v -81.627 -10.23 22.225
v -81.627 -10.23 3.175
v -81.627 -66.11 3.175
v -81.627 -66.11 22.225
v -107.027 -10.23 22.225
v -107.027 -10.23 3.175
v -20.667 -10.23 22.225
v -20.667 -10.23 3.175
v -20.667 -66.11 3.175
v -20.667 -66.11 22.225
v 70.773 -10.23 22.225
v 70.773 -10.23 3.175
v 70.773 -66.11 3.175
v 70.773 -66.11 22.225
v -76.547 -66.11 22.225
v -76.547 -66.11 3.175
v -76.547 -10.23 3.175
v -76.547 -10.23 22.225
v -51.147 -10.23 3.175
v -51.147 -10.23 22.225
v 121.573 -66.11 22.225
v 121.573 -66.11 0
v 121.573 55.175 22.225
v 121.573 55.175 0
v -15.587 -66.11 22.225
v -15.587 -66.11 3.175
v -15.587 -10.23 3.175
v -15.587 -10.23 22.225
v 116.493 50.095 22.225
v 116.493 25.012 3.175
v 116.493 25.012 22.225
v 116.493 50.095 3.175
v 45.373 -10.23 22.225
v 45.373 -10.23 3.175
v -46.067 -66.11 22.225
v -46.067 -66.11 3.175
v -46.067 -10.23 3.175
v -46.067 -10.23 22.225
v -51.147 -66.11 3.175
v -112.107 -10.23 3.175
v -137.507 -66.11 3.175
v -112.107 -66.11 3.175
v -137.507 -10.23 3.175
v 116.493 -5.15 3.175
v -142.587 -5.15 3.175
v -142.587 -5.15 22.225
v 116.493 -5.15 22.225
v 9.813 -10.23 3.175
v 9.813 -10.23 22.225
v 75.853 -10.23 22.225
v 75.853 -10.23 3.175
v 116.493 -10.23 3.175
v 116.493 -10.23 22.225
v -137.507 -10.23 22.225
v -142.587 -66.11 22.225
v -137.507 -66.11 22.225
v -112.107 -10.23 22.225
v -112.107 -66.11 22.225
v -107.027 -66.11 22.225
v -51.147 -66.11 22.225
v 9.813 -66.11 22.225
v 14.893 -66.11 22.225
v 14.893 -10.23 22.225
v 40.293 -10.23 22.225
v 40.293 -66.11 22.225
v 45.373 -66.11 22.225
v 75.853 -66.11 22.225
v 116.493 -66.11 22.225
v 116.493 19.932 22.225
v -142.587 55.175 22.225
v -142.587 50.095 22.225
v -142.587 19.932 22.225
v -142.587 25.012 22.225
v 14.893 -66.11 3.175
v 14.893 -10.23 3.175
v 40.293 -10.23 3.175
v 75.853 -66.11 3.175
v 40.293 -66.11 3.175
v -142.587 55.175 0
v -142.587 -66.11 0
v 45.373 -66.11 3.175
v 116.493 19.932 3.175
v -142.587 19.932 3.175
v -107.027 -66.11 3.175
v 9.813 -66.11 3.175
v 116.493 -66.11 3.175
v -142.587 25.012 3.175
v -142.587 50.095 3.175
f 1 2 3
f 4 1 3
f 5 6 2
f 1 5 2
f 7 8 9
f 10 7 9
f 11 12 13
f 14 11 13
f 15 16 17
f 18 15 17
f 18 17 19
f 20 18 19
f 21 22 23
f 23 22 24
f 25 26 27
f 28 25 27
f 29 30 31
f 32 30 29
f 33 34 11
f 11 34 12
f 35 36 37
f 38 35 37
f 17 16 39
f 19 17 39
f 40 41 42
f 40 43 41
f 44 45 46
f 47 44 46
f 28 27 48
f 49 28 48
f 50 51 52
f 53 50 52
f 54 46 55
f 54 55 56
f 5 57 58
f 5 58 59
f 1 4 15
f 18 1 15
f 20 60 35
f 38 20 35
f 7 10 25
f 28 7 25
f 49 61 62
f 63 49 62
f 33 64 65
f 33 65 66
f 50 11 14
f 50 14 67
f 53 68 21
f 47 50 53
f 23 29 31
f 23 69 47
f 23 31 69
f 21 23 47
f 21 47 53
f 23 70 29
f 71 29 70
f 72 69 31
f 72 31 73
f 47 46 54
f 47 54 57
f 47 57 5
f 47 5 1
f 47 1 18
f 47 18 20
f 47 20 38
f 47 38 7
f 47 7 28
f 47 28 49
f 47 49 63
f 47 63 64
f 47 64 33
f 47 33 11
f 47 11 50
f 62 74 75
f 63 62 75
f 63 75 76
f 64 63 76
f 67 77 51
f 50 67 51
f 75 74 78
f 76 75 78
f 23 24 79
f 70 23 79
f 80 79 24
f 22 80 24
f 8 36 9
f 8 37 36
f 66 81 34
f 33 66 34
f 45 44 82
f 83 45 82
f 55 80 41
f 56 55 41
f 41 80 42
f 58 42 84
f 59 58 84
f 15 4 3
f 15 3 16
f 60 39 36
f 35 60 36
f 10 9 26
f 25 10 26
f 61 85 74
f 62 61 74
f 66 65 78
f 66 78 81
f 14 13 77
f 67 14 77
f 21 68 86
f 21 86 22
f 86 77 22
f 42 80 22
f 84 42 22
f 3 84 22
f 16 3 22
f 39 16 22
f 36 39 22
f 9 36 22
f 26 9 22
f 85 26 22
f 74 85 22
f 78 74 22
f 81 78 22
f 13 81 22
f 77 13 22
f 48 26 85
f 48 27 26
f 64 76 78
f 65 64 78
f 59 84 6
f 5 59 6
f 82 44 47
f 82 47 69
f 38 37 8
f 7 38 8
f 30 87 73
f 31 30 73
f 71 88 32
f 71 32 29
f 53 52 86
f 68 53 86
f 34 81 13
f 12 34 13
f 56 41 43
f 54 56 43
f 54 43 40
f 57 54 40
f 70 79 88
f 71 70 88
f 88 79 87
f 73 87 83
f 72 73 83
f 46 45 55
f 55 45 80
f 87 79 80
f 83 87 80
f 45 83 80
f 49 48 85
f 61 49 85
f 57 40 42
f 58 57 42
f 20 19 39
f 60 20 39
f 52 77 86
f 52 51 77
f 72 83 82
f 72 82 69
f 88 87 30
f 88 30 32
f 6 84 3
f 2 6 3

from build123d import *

# Parameters (mm, degrees)
F0_W     = 254
F0_H     = 25.0825
F1_DEPTH = 3.175
F2_DEPTH = 22.225
F3_DEPTH = 25.4


# Not quite as in the source:
# - a feature names something its author has since deleted; it is built from what else it names


with BuildPart() as f1:
    # F0 (on Top) → F1 (new body)
    with BuildSketch(Plane.XY):
        with Locations((-10.5066807906, 37.553641122)):
            Rectangle(F0_W, F0_H)
    extrude(amount=F1_DEPTH)



with BuildPart() as f1b:
    # F0 (on Top) → F1, piece 2 (new body)
    with BuildSketch(Plane.XY):
        with Locations((-10.5066807906, 7.391141122)):
            Rectangle(F0_W, F0_H)
    extrude(amount=F1_DEPTH)


with BuildPart() as f1c:
    # F0 (on Top) → F1, piece 3 (new body)
    with BuildSketch(Plane.XY):
        Polygon((-137.5066807906, -61.030108878), (-137.5066807906, -66.110108878), (-112.1066807906, -66.110108878), (-112.1066807906, -61.030108878), (-112.1066807906, -10.230108878), (-137.5066807906, -10.230108878), align=None)
    extrude(amount=F1_DEPTH)


with BuildPart() as f1d:
    # F0 (on Top) → F1, piece 4 (new body)
    with BuildSketch(Plane.XY):
        Polygon((-107.0266807906, -61.030108878), (-107.0266807906, -66.110108878), (-81.6266807906, -66.110108878), (-81.6266807906, -61.030108878), (-81.6266807906, -10.230108878), (-107.0266807906, -10.230108878), align=None)
    extrude(amount=F1_DEPTH)


with BuildPart() as f1e:
    # F0 (on Top) → F1, piece 5 (new body)
    with BuildSketch(Plane.XY):
        Polygon((-76.5466807906, -61.030108878), (-76.5466807906, -66.110108878), (-51.1466807906, -66.110108878), (-51.1466807906, -61.030108878), (-51.1466807906, -10.230108878), (-76.5466807906, -10.230108878), align=None)
    extrude(amount=F1_DEPTH)


with BuildPart() as f1f:
    # F0 (on Top) → F1, piece 6 (new body)
    with BuildSketch(Plane.XY):
        Polygon((-46.0666807906, -61.030108878), (-46.0666807906, -66.110108878), (-20.6666807906, -66.110108878), (-20.6666807906, -61.030108878), (-20.6666807906, -10.230108878), (-46.0666807906, -10.230108878), align=None)
    extrude(amount=F1_DEPTH)


with BuildPart() as f1g:
    # F0 (on Top) → F1, piece 7 (new body)
    with BuildSketch(Plane.XY):
        Polygon((-15.5866807906, -66.110108878), (9.8133192094, -66.110108878), (9.8133192094, -61.030108878), (9.8133192094, -10.230108878), (-15.5866807906, -10.230108878), (-15.5866807906, -61.030108878), align=None)
    extrude(amount=F1_DEPTH)


with BuildPart() as f1h:
    # F0 (on Top) → F1, piece 8 (new body)
    with BuildSketch(Plane.XY):
        Polygon((14.8933192094, -66.110108878), (40.2933192094, -66.110108878), (40.2933192094, -61.030108878), (40.2933192094, -10.230108878), (14.8933192094, -10.230108878), (14.8933192094, -61.030108878), align=None)
    extrude(amount=F1_DEPTH)


with BuildPart() as f1i:
    # F0 (on Top) → F1, piece 9 (new body)
    with BuildSketch(Plane.XY):
        Polygon((45.3733192094, -66.110108878), (70.7733192094, -66.110108878), (70.7733192094, -61.030108878), (70.7733192094, -10.230108878), (45.3733192094, -10.230108878), (45.3733192094, -61.030108878), align=None)
    extrude(amount=F1_DEPTH)


with BuildPart() as f1j:
    # F0 (on Top) → F1, piece 10 (new body)
    with BuildSketch(Plane.XY):
        Polygon((75.8533192094, -66.110108878), (116.4933192094, -66.110108878), (116.4933192094, -61.030108878), (116.4933192094, -10.230108878), (75.8533192094, -10.230108878), (75.8533192094, -61.030108878), align=None)
    extrude(amount=F1_DEPTH)


with BuildPart() as f1_1:
    add(f1.part)

    add(f1b.part)  # F2 merges F1b

    add(f1c.part)  # F2 merges F1c

    add(f1d.part)  # F2 merges F1d

    add(f1e.part)  # F2 merges F1e

    add(f1f.part)  # F2 merges F1f

    add(f1g.part)  # F2 merges F1g

    add(f1h.part)  # F2 merges F1h

    add(f1i.part)  # F2 merges F1i

    add(f1j.part)  # F2 merges F1j
    # F0 (on Top) → F2 (join)
    with BuildSketch(Plane.XY):
        Polygon((121.5733192094, 55.174891122), (-142.5866807906, 55.174891122), (-142.5866807906, -66.110108878), (-137.5066807906, -66.110108878), (-137.5066807906, -61.030108878), (-137.5066807906, -10.230108878), (-112.1066807906, -10.230108878), (-107.0266807906, -10.230108878), (-81.6266807906, -10.230108878), (-76.5466807906, -10.230108878), (-51.1466807906, -10.230108878), (-46.0666807906, -10.230108878), (-20.6666807906, -10.230108878), (-15.5866807906, -10.230108878), (9.8133192094, -10.230108878), (14.8933192094, -10.230108878), (40.2933192094, -10.230108878), (45.3733192094, -10.230108878), (70.7733192094, -10.230108878), (75.8533192094, -10.230108878), (116.4933192094, -10.230108878), (116.4933192094, -61.030108878), (116.4933192094, -66.110108878), (121.5733192094, -66.110108878), align=None)
        with Locations((-10.5066807906, 7.391141122)):
            Rectangle(F0_W, F0_H, mode=Mode.SUBTRACT)
        with Locations((-10.5066807906, 37.553641122)):
            Rectangle(F0_W, F0_H, mode=Mode.SUBTRACT)
        Polygon((-112.1066807906, -61.030108878), (-112.1066807906, -66.110108878), (-107.0266807906, -66.110108878), (-107.0266807906, -61.030108878), (-107.0266807906, -10.230108878), (-112.1066807906, -10.230108878), align=None)
        Polygon((-81.6266807906, -61.030108878), (-81.6266807906, -66.110108878), (-76.5466807906, -66.110108878), (-76.5466807906, -61.030108878), (-76.5466807906, -10.230108878), (-81.6266807906, -10.230108878), align=None)
        Polygon((-51.1466807906, -61.030108878), (-51.1466807906, -66.110108878), (-46.0666807906, -66.110108878), (-46.0666807906, -61.030108878), (-46.0666807906, -10.230108878), (-51.1466807906, -10.230108878), align=None)
        Polygon((-20.6666807906, -61.030108878), (-20.6666807906, -66.110108878), (-15.5866807906, -66.110108878), (-15.5866807906, -61.030108878), (-15.5866807906, -10.230108878), (-20.6666807906, -10.230108878), align=None)
        Polygon((9.8133192094, -66.110108878), (14.8933192094, -66.110108878), (14.8933192094, -61.030108878), (14.8933192094, -10.230108878), (9.8133192094, -10.230108878), (9.8133192094, -61.030108878), align=None)
        Polygon((40.2933192094, -66.110108878), (45.3733192094, -66.110108878), (45.3733192094, -61.030108878), (45.3733192094, -10.230108878), (40.2933192094, -10.230108878), (40.2933192094, -61.030108878), align=None)
        Polygon((70.7733192094, -66.110108878), (75.8533192094, -66.110108878), (75.8533192094, -61.030108878), (75.8533192094, -10.230108878), (70.7733192094, -10.230108878), (70.7733192094, -61.030108878), align=None)
    extrude(amount=F2_DEPTH)

    # F3 (cut): faces of the model
    f3_faces = [f1_1.faces().sort_by_distance(p)[0] for p in [
        (-137.5066807906, 7.391141122, 12.7),
        (-137.5066807906, 37.553641122, 12.7),
    ]]
    extrude(f3_faces, amount=-F3_DEPTH, mode=Mode.SUBTRACT)


solid = f1_1.part
